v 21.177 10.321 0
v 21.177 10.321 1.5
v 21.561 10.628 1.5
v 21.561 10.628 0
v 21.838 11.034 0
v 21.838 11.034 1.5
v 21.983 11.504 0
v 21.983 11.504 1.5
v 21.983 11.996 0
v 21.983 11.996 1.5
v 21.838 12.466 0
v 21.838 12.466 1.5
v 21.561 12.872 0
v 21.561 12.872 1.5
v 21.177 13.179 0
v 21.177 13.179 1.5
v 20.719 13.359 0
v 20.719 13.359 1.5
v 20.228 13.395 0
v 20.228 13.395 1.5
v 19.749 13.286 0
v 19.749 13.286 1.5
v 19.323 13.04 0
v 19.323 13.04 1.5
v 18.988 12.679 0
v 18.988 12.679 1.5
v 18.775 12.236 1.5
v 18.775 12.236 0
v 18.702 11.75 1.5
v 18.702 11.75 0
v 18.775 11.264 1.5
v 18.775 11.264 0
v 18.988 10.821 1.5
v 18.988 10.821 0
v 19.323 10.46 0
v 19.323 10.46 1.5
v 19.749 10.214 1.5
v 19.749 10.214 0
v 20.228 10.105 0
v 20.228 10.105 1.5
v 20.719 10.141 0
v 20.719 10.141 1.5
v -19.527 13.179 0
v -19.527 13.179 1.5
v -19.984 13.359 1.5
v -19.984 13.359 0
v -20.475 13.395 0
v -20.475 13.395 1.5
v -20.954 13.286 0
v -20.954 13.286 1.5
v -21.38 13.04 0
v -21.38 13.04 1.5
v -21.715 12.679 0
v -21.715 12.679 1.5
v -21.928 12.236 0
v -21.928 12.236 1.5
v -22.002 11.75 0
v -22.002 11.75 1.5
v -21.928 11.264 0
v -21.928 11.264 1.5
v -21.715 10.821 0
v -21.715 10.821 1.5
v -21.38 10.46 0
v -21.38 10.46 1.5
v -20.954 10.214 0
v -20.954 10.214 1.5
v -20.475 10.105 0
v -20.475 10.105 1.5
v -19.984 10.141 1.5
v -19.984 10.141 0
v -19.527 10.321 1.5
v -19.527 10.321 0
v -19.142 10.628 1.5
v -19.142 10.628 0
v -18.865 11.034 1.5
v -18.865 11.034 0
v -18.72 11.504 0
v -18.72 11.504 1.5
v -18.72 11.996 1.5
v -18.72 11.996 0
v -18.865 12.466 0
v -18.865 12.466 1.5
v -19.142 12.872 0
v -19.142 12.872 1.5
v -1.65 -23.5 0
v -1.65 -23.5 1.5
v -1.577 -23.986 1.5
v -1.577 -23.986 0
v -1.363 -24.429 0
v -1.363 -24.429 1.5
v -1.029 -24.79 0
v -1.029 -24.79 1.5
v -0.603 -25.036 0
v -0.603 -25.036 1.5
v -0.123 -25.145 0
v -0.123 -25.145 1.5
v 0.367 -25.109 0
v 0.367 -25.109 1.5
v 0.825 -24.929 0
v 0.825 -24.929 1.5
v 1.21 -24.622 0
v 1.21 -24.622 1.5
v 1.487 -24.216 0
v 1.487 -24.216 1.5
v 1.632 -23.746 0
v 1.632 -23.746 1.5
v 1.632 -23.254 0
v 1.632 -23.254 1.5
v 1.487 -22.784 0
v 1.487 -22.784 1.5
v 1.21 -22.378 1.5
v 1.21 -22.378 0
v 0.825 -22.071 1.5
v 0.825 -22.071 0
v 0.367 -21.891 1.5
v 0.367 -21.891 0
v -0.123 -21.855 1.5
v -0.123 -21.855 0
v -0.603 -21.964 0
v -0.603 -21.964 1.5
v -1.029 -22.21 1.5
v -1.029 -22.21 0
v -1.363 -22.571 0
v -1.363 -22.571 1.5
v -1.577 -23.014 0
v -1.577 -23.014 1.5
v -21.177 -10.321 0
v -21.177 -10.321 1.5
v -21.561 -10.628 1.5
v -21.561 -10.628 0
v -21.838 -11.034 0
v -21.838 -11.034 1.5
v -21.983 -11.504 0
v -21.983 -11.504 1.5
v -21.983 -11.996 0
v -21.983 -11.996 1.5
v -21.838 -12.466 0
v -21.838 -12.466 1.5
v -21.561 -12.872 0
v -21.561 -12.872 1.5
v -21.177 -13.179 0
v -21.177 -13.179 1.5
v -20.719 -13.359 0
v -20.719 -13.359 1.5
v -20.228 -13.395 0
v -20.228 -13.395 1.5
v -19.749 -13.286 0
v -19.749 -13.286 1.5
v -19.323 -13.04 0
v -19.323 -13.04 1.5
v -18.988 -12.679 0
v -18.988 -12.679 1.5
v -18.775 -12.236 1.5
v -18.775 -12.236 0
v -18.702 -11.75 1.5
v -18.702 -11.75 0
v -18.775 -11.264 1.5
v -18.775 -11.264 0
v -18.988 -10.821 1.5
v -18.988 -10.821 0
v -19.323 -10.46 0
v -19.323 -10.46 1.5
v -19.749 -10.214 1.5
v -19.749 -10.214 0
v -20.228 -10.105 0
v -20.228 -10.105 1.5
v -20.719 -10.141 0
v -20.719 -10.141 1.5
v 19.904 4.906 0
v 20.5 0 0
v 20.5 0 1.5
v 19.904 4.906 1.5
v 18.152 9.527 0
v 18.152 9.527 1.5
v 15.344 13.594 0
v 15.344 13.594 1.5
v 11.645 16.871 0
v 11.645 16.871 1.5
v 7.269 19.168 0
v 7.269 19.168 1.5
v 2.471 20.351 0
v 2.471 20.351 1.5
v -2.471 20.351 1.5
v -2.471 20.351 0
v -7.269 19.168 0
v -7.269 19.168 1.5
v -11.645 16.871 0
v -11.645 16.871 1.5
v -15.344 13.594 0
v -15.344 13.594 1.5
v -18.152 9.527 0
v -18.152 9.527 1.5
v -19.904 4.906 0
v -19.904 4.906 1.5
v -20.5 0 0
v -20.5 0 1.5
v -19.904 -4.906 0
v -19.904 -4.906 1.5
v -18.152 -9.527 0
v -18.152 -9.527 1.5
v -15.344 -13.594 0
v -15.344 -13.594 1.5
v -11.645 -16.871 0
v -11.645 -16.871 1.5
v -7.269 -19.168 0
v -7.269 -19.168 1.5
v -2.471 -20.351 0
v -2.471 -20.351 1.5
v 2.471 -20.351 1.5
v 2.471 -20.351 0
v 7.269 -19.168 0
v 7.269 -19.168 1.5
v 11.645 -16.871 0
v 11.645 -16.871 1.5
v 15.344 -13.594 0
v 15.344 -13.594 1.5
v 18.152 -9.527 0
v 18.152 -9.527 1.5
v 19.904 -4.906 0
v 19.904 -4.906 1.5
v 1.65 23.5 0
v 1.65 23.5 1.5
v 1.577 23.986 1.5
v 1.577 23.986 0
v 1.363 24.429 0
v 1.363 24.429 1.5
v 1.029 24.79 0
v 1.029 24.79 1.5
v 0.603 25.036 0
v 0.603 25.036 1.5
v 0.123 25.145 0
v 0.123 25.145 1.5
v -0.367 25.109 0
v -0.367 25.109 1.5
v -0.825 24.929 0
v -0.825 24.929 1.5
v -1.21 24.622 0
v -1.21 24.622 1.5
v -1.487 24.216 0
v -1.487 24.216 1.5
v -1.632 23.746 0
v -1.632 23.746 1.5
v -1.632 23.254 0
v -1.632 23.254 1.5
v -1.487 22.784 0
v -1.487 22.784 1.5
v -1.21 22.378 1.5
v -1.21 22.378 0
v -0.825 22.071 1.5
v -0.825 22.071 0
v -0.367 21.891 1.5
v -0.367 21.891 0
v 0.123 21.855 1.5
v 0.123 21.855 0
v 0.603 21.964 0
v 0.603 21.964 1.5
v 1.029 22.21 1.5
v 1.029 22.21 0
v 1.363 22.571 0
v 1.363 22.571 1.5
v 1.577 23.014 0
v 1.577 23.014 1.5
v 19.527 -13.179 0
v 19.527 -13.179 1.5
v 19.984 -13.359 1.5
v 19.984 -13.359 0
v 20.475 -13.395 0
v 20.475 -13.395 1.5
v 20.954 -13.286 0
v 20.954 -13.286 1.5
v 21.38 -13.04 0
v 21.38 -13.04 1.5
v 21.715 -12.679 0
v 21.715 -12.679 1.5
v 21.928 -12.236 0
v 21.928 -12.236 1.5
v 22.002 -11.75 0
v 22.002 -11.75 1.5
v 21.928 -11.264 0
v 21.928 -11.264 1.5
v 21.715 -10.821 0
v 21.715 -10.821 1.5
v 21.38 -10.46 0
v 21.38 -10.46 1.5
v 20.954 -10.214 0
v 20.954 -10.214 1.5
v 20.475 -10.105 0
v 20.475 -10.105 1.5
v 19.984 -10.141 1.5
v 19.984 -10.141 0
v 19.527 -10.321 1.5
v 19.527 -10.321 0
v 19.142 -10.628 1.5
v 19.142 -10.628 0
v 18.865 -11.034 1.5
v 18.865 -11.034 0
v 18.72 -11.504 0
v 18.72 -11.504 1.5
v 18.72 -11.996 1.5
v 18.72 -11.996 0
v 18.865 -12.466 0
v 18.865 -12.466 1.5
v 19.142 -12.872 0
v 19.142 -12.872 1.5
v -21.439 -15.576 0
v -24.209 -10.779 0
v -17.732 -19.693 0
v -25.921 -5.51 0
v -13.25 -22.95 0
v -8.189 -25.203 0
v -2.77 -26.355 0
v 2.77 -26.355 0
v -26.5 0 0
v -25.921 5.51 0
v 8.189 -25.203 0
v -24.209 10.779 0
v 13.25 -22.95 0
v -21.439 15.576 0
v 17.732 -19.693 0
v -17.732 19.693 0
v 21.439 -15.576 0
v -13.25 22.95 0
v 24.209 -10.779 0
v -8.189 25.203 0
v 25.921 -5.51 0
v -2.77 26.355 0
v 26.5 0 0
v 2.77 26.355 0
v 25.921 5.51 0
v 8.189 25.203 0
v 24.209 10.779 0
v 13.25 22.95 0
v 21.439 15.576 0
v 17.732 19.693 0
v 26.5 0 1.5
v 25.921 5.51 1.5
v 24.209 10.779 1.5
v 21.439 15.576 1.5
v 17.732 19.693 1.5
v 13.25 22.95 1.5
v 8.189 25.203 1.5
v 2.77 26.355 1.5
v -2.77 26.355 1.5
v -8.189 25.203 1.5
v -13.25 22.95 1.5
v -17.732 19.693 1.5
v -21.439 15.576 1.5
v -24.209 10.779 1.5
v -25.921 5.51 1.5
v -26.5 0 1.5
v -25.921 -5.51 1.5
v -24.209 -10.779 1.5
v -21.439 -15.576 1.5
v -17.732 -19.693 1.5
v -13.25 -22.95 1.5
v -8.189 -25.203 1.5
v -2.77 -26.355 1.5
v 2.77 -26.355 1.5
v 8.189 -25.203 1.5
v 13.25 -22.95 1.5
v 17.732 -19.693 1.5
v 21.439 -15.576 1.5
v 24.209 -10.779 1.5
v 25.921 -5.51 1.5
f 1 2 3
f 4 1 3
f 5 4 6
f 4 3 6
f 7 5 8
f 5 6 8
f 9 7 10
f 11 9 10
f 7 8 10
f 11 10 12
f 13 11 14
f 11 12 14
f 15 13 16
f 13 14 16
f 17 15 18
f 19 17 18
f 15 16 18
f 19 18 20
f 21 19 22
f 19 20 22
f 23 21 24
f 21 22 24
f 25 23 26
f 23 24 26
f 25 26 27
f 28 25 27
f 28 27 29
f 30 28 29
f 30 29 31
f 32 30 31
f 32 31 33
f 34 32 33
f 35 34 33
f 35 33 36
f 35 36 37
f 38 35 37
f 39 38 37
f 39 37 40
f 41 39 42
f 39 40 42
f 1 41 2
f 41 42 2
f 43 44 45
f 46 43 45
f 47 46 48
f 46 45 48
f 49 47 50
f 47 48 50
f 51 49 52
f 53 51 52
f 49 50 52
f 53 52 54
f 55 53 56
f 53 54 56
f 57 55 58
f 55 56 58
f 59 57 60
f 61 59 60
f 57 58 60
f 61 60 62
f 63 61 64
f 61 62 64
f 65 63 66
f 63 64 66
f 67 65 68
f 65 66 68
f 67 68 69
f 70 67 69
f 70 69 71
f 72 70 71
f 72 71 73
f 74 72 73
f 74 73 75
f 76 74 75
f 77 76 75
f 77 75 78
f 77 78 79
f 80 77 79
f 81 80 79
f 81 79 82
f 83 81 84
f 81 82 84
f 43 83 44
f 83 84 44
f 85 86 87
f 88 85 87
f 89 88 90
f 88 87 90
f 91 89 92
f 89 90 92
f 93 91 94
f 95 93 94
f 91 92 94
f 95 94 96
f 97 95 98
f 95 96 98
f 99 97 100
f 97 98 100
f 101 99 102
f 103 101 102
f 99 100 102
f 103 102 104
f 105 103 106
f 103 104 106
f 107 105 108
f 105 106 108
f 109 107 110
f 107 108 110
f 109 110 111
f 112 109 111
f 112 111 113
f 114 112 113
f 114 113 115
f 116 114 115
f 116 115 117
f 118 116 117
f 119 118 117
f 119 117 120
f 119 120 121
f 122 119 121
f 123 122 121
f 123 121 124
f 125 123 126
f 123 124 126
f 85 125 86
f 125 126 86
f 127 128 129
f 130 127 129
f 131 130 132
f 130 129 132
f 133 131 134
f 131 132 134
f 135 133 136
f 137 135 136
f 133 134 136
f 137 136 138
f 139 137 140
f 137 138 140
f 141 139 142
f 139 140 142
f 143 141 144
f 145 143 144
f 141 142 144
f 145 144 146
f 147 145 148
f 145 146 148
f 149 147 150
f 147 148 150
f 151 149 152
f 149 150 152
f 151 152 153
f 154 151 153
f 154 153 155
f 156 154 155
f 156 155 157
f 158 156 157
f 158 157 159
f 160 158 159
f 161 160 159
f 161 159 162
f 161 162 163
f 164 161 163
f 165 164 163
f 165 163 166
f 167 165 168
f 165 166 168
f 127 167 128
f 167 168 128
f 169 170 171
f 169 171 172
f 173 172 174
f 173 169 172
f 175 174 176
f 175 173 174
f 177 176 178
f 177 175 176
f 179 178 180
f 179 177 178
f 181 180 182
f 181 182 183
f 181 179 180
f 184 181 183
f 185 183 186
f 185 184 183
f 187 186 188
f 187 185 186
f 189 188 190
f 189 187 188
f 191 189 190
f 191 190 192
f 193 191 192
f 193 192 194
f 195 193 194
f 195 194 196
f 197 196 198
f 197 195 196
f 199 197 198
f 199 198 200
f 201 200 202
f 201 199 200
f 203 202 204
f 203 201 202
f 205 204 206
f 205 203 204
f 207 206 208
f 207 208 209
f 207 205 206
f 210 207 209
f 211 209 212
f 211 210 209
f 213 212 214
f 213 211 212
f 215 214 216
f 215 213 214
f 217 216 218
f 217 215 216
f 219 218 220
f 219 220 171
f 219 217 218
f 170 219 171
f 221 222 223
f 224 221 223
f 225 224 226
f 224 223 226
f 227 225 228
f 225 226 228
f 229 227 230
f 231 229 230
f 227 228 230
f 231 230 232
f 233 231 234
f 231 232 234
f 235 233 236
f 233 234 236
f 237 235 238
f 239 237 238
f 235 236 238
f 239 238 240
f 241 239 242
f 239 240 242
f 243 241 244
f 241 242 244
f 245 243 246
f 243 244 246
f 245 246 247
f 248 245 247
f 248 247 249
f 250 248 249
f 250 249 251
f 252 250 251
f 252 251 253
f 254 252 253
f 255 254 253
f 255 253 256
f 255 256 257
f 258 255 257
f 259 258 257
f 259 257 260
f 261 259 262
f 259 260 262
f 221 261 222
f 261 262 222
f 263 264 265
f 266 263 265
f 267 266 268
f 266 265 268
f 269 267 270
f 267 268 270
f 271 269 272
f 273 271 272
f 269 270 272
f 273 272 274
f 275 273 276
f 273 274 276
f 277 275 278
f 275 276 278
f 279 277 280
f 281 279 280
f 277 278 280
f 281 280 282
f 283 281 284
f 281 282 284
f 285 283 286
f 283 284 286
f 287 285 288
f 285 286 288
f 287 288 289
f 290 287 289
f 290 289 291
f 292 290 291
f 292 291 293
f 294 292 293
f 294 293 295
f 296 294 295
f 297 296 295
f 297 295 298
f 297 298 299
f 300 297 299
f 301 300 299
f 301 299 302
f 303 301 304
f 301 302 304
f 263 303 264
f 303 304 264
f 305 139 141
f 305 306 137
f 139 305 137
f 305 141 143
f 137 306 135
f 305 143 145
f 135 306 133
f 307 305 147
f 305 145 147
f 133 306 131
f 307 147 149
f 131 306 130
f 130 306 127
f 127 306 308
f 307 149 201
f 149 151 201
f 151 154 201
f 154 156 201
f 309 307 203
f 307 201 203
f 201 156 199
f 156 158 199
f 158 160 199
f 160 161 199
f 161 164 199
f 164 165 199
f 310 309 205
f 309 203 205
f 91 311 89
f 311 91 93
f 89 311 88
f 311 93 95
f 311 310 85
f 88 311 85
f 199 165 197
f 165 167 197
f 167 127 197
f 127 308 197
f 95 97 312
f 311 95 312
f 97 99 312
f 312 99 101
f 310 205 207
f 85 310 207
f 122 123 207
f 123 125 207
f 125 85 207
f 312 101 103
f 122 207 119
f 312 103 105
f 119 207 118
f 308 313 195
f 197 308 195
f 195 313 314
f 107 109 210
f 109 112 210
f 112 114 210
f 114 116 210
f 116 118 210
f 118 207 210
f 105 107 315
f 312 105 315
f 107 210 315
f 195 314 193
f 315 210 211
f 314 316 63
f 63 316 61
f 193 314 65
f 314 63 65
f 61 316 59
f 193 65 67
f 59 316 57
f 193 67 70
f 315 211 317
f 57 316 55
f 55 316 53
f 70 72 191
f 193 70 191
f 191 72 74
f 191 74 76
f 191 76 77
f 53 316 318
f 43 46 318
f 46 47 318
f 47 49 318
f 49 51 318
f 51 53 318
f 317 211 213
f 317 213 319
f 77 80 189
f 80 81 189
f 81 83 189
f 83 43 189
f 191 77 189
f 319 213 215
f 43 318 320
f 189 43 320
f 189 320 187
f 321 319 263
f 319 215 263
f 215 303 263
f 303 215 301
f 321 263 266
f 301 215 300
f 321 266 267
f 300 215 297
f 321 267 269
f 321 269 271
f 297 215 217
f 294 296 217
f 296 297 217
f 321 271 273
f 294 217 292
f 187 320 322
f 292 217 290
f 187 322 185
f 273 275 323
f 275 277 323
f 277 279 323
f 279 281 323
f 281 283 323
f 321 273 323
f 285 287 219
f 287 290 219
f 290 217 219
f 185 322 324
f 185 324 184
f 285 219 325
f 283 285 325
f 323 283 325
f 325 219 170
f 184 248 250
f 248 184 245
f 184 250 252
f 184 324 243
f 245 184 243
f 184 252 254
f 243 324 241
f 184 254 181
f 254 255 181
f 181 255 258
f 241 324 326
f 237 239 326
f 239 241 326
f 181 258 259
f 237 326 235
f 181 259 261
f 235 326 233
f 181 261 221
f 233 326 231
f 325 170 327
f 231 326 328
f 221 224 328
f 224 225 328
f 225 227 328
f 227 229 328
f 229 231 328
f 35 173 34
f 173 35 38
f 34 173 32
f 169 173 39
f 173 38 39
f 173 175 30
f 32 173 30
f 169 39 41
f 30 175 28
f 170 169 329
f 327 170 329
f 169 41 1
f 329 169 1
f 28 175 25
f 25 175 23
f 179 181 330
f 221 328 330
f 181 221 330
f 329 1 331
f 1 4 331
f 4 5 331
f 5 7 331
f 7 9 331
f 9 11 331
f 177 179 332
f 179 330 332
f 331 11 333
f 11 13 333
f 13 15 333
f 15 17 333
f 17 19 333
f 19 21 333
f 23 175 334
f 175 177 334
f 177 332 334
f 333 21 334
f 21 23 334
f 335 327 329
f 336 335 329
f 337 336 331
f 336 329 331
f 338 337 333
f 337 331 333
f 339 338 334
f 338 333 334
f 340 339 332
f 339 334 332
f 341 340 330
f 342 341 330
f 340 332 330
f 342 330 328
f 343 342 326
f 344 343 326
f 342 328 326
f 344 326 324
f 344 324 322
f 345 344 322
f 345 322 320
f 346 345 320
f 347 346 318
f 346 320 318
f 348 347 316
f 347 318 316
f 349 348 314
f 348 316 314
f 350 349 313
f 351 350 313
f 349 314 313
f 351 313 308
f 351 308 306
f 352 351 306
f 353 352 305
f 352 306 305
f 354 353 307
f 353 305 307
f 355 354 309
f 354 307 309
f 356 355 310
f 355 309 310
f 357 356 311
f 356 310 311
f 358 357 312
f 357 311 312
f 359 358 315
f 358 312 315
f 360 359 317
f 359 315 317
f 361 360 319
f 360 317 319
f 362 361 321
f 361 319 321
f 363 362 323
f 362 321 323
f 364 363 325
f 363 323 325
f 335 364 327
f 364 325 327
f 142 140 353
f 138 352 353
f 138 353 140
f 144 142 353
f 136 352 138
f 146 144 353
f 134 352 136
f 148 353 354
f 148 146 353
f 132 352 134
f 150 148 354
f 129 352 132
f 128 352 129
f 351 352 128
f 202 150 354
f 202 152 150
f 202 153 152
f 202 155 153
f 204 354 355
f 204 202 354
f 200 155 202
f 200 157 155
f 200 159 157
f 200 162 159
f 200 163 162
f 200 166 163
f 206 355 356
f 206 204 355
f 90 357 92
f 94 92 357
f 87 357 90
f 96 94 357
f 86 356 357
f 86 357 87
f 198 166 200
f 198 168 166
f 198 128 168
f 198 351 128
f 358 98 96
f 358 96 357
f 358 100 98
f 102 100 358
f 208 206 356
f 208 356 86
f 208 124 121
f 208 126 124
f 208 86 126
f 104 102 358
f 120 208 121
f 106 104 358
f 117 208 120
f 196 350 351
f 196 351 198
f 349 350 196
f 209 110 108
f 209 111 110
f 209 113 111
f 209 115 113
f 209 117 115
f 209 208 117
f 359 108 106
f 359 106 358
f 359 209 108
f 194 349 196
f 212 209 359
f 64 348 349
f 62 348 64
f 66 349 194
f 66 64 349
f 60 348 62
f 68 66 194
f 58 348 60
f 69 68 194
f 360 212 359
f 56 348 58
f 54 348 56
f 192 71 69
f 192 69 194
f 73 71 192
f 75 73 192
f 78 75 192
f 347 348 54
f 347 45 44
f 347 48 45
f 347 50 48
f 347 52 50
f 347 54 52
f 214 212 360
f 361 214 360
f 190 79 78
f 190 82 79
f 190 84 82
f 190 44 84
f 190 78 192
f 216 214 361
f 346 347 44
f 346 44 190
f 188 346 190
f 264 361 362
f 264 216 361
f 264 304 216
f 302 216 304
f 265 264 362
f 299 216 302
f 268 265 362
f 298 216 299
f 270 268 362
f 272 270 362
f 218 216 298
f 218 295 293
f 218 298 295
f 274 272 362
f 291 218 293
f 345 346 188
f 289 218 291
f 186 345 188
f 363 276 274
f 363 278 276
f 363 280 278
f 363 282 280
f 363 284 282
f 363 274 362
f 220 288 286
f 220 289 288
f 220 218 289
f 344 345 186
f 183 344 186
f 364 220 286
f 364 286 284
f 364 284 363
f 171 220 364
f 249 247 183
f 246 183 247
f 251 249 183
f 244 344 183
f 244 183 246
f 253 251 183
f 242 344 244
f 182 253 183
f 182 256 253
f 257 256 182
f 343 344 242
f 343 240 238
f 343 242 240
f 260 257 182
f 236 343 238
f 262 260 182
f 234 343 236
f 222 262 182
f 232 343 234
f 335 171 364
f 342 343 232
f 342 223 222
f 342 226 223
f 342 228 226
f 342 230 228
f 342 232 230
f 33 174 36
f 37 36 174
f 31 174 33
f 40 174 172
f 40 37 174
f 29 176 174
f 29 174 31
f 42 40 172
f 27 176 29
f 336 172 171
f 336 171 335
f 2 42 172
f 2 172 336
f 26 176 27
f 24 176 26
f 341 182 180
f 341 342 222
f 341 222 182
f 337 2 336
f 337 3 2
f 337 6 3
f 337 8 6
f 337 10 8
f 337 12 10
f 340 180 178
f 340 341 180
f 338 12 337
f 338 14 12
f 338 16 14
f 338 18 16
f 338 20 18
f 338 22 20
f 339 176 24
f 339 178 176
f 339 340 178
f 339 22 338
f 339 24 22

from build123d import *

# Parameters (mm, degrees)
SKETCH_1_R               = 26.5
SKETCH_1_R_2             = 20.5
EXTRUDE_1_DEPTH          = 1.5
SKETCH_2_R               = 1.65
CUT_EXTRUDE_1_DEPTH      = 1.5
PATTERN_CIRCULAR_1_COUNT = 6


with BuildPart() as part:
    # 草图1 → 凸台-拉伸1 (new body)
    with BuildSketch(Plane.XY):
        Circle(SKETCH_1_R)
        Circle(SKETCH_1_R_2, mode=Mode.SUBTRACT)
    extrude(amount=EXTRUDE_1_DEPTH)

    # 草图2 → 切除-拉伸1 (cut)
    with BuildSketch(Plane.XY.offset(1.5)):
        with Locations((0, 23.5)):
            Circle(SKETCH_2_R)
    cut_extrude_1 = extrude(amount=-CUT_EXTRUDE_1_DEPTH, mode=Mode.SUBTRACT)

    # 阵列(圆周)1: 切除-拉伸1 ×6 about axis
    pattern_circular_1_axis = Axis((0, 0, 0), (0, 0, 1))
    for i in range(1, PATTERN_CIRCULAR_1_COUNT):
        add(cut_extrude_1.rotate(pattern_circular_1_axis, i * 360 / PATTERN_CIRCULAR_1_COUNT), mode=Mode.SUBTRACT)


solid = part.part
